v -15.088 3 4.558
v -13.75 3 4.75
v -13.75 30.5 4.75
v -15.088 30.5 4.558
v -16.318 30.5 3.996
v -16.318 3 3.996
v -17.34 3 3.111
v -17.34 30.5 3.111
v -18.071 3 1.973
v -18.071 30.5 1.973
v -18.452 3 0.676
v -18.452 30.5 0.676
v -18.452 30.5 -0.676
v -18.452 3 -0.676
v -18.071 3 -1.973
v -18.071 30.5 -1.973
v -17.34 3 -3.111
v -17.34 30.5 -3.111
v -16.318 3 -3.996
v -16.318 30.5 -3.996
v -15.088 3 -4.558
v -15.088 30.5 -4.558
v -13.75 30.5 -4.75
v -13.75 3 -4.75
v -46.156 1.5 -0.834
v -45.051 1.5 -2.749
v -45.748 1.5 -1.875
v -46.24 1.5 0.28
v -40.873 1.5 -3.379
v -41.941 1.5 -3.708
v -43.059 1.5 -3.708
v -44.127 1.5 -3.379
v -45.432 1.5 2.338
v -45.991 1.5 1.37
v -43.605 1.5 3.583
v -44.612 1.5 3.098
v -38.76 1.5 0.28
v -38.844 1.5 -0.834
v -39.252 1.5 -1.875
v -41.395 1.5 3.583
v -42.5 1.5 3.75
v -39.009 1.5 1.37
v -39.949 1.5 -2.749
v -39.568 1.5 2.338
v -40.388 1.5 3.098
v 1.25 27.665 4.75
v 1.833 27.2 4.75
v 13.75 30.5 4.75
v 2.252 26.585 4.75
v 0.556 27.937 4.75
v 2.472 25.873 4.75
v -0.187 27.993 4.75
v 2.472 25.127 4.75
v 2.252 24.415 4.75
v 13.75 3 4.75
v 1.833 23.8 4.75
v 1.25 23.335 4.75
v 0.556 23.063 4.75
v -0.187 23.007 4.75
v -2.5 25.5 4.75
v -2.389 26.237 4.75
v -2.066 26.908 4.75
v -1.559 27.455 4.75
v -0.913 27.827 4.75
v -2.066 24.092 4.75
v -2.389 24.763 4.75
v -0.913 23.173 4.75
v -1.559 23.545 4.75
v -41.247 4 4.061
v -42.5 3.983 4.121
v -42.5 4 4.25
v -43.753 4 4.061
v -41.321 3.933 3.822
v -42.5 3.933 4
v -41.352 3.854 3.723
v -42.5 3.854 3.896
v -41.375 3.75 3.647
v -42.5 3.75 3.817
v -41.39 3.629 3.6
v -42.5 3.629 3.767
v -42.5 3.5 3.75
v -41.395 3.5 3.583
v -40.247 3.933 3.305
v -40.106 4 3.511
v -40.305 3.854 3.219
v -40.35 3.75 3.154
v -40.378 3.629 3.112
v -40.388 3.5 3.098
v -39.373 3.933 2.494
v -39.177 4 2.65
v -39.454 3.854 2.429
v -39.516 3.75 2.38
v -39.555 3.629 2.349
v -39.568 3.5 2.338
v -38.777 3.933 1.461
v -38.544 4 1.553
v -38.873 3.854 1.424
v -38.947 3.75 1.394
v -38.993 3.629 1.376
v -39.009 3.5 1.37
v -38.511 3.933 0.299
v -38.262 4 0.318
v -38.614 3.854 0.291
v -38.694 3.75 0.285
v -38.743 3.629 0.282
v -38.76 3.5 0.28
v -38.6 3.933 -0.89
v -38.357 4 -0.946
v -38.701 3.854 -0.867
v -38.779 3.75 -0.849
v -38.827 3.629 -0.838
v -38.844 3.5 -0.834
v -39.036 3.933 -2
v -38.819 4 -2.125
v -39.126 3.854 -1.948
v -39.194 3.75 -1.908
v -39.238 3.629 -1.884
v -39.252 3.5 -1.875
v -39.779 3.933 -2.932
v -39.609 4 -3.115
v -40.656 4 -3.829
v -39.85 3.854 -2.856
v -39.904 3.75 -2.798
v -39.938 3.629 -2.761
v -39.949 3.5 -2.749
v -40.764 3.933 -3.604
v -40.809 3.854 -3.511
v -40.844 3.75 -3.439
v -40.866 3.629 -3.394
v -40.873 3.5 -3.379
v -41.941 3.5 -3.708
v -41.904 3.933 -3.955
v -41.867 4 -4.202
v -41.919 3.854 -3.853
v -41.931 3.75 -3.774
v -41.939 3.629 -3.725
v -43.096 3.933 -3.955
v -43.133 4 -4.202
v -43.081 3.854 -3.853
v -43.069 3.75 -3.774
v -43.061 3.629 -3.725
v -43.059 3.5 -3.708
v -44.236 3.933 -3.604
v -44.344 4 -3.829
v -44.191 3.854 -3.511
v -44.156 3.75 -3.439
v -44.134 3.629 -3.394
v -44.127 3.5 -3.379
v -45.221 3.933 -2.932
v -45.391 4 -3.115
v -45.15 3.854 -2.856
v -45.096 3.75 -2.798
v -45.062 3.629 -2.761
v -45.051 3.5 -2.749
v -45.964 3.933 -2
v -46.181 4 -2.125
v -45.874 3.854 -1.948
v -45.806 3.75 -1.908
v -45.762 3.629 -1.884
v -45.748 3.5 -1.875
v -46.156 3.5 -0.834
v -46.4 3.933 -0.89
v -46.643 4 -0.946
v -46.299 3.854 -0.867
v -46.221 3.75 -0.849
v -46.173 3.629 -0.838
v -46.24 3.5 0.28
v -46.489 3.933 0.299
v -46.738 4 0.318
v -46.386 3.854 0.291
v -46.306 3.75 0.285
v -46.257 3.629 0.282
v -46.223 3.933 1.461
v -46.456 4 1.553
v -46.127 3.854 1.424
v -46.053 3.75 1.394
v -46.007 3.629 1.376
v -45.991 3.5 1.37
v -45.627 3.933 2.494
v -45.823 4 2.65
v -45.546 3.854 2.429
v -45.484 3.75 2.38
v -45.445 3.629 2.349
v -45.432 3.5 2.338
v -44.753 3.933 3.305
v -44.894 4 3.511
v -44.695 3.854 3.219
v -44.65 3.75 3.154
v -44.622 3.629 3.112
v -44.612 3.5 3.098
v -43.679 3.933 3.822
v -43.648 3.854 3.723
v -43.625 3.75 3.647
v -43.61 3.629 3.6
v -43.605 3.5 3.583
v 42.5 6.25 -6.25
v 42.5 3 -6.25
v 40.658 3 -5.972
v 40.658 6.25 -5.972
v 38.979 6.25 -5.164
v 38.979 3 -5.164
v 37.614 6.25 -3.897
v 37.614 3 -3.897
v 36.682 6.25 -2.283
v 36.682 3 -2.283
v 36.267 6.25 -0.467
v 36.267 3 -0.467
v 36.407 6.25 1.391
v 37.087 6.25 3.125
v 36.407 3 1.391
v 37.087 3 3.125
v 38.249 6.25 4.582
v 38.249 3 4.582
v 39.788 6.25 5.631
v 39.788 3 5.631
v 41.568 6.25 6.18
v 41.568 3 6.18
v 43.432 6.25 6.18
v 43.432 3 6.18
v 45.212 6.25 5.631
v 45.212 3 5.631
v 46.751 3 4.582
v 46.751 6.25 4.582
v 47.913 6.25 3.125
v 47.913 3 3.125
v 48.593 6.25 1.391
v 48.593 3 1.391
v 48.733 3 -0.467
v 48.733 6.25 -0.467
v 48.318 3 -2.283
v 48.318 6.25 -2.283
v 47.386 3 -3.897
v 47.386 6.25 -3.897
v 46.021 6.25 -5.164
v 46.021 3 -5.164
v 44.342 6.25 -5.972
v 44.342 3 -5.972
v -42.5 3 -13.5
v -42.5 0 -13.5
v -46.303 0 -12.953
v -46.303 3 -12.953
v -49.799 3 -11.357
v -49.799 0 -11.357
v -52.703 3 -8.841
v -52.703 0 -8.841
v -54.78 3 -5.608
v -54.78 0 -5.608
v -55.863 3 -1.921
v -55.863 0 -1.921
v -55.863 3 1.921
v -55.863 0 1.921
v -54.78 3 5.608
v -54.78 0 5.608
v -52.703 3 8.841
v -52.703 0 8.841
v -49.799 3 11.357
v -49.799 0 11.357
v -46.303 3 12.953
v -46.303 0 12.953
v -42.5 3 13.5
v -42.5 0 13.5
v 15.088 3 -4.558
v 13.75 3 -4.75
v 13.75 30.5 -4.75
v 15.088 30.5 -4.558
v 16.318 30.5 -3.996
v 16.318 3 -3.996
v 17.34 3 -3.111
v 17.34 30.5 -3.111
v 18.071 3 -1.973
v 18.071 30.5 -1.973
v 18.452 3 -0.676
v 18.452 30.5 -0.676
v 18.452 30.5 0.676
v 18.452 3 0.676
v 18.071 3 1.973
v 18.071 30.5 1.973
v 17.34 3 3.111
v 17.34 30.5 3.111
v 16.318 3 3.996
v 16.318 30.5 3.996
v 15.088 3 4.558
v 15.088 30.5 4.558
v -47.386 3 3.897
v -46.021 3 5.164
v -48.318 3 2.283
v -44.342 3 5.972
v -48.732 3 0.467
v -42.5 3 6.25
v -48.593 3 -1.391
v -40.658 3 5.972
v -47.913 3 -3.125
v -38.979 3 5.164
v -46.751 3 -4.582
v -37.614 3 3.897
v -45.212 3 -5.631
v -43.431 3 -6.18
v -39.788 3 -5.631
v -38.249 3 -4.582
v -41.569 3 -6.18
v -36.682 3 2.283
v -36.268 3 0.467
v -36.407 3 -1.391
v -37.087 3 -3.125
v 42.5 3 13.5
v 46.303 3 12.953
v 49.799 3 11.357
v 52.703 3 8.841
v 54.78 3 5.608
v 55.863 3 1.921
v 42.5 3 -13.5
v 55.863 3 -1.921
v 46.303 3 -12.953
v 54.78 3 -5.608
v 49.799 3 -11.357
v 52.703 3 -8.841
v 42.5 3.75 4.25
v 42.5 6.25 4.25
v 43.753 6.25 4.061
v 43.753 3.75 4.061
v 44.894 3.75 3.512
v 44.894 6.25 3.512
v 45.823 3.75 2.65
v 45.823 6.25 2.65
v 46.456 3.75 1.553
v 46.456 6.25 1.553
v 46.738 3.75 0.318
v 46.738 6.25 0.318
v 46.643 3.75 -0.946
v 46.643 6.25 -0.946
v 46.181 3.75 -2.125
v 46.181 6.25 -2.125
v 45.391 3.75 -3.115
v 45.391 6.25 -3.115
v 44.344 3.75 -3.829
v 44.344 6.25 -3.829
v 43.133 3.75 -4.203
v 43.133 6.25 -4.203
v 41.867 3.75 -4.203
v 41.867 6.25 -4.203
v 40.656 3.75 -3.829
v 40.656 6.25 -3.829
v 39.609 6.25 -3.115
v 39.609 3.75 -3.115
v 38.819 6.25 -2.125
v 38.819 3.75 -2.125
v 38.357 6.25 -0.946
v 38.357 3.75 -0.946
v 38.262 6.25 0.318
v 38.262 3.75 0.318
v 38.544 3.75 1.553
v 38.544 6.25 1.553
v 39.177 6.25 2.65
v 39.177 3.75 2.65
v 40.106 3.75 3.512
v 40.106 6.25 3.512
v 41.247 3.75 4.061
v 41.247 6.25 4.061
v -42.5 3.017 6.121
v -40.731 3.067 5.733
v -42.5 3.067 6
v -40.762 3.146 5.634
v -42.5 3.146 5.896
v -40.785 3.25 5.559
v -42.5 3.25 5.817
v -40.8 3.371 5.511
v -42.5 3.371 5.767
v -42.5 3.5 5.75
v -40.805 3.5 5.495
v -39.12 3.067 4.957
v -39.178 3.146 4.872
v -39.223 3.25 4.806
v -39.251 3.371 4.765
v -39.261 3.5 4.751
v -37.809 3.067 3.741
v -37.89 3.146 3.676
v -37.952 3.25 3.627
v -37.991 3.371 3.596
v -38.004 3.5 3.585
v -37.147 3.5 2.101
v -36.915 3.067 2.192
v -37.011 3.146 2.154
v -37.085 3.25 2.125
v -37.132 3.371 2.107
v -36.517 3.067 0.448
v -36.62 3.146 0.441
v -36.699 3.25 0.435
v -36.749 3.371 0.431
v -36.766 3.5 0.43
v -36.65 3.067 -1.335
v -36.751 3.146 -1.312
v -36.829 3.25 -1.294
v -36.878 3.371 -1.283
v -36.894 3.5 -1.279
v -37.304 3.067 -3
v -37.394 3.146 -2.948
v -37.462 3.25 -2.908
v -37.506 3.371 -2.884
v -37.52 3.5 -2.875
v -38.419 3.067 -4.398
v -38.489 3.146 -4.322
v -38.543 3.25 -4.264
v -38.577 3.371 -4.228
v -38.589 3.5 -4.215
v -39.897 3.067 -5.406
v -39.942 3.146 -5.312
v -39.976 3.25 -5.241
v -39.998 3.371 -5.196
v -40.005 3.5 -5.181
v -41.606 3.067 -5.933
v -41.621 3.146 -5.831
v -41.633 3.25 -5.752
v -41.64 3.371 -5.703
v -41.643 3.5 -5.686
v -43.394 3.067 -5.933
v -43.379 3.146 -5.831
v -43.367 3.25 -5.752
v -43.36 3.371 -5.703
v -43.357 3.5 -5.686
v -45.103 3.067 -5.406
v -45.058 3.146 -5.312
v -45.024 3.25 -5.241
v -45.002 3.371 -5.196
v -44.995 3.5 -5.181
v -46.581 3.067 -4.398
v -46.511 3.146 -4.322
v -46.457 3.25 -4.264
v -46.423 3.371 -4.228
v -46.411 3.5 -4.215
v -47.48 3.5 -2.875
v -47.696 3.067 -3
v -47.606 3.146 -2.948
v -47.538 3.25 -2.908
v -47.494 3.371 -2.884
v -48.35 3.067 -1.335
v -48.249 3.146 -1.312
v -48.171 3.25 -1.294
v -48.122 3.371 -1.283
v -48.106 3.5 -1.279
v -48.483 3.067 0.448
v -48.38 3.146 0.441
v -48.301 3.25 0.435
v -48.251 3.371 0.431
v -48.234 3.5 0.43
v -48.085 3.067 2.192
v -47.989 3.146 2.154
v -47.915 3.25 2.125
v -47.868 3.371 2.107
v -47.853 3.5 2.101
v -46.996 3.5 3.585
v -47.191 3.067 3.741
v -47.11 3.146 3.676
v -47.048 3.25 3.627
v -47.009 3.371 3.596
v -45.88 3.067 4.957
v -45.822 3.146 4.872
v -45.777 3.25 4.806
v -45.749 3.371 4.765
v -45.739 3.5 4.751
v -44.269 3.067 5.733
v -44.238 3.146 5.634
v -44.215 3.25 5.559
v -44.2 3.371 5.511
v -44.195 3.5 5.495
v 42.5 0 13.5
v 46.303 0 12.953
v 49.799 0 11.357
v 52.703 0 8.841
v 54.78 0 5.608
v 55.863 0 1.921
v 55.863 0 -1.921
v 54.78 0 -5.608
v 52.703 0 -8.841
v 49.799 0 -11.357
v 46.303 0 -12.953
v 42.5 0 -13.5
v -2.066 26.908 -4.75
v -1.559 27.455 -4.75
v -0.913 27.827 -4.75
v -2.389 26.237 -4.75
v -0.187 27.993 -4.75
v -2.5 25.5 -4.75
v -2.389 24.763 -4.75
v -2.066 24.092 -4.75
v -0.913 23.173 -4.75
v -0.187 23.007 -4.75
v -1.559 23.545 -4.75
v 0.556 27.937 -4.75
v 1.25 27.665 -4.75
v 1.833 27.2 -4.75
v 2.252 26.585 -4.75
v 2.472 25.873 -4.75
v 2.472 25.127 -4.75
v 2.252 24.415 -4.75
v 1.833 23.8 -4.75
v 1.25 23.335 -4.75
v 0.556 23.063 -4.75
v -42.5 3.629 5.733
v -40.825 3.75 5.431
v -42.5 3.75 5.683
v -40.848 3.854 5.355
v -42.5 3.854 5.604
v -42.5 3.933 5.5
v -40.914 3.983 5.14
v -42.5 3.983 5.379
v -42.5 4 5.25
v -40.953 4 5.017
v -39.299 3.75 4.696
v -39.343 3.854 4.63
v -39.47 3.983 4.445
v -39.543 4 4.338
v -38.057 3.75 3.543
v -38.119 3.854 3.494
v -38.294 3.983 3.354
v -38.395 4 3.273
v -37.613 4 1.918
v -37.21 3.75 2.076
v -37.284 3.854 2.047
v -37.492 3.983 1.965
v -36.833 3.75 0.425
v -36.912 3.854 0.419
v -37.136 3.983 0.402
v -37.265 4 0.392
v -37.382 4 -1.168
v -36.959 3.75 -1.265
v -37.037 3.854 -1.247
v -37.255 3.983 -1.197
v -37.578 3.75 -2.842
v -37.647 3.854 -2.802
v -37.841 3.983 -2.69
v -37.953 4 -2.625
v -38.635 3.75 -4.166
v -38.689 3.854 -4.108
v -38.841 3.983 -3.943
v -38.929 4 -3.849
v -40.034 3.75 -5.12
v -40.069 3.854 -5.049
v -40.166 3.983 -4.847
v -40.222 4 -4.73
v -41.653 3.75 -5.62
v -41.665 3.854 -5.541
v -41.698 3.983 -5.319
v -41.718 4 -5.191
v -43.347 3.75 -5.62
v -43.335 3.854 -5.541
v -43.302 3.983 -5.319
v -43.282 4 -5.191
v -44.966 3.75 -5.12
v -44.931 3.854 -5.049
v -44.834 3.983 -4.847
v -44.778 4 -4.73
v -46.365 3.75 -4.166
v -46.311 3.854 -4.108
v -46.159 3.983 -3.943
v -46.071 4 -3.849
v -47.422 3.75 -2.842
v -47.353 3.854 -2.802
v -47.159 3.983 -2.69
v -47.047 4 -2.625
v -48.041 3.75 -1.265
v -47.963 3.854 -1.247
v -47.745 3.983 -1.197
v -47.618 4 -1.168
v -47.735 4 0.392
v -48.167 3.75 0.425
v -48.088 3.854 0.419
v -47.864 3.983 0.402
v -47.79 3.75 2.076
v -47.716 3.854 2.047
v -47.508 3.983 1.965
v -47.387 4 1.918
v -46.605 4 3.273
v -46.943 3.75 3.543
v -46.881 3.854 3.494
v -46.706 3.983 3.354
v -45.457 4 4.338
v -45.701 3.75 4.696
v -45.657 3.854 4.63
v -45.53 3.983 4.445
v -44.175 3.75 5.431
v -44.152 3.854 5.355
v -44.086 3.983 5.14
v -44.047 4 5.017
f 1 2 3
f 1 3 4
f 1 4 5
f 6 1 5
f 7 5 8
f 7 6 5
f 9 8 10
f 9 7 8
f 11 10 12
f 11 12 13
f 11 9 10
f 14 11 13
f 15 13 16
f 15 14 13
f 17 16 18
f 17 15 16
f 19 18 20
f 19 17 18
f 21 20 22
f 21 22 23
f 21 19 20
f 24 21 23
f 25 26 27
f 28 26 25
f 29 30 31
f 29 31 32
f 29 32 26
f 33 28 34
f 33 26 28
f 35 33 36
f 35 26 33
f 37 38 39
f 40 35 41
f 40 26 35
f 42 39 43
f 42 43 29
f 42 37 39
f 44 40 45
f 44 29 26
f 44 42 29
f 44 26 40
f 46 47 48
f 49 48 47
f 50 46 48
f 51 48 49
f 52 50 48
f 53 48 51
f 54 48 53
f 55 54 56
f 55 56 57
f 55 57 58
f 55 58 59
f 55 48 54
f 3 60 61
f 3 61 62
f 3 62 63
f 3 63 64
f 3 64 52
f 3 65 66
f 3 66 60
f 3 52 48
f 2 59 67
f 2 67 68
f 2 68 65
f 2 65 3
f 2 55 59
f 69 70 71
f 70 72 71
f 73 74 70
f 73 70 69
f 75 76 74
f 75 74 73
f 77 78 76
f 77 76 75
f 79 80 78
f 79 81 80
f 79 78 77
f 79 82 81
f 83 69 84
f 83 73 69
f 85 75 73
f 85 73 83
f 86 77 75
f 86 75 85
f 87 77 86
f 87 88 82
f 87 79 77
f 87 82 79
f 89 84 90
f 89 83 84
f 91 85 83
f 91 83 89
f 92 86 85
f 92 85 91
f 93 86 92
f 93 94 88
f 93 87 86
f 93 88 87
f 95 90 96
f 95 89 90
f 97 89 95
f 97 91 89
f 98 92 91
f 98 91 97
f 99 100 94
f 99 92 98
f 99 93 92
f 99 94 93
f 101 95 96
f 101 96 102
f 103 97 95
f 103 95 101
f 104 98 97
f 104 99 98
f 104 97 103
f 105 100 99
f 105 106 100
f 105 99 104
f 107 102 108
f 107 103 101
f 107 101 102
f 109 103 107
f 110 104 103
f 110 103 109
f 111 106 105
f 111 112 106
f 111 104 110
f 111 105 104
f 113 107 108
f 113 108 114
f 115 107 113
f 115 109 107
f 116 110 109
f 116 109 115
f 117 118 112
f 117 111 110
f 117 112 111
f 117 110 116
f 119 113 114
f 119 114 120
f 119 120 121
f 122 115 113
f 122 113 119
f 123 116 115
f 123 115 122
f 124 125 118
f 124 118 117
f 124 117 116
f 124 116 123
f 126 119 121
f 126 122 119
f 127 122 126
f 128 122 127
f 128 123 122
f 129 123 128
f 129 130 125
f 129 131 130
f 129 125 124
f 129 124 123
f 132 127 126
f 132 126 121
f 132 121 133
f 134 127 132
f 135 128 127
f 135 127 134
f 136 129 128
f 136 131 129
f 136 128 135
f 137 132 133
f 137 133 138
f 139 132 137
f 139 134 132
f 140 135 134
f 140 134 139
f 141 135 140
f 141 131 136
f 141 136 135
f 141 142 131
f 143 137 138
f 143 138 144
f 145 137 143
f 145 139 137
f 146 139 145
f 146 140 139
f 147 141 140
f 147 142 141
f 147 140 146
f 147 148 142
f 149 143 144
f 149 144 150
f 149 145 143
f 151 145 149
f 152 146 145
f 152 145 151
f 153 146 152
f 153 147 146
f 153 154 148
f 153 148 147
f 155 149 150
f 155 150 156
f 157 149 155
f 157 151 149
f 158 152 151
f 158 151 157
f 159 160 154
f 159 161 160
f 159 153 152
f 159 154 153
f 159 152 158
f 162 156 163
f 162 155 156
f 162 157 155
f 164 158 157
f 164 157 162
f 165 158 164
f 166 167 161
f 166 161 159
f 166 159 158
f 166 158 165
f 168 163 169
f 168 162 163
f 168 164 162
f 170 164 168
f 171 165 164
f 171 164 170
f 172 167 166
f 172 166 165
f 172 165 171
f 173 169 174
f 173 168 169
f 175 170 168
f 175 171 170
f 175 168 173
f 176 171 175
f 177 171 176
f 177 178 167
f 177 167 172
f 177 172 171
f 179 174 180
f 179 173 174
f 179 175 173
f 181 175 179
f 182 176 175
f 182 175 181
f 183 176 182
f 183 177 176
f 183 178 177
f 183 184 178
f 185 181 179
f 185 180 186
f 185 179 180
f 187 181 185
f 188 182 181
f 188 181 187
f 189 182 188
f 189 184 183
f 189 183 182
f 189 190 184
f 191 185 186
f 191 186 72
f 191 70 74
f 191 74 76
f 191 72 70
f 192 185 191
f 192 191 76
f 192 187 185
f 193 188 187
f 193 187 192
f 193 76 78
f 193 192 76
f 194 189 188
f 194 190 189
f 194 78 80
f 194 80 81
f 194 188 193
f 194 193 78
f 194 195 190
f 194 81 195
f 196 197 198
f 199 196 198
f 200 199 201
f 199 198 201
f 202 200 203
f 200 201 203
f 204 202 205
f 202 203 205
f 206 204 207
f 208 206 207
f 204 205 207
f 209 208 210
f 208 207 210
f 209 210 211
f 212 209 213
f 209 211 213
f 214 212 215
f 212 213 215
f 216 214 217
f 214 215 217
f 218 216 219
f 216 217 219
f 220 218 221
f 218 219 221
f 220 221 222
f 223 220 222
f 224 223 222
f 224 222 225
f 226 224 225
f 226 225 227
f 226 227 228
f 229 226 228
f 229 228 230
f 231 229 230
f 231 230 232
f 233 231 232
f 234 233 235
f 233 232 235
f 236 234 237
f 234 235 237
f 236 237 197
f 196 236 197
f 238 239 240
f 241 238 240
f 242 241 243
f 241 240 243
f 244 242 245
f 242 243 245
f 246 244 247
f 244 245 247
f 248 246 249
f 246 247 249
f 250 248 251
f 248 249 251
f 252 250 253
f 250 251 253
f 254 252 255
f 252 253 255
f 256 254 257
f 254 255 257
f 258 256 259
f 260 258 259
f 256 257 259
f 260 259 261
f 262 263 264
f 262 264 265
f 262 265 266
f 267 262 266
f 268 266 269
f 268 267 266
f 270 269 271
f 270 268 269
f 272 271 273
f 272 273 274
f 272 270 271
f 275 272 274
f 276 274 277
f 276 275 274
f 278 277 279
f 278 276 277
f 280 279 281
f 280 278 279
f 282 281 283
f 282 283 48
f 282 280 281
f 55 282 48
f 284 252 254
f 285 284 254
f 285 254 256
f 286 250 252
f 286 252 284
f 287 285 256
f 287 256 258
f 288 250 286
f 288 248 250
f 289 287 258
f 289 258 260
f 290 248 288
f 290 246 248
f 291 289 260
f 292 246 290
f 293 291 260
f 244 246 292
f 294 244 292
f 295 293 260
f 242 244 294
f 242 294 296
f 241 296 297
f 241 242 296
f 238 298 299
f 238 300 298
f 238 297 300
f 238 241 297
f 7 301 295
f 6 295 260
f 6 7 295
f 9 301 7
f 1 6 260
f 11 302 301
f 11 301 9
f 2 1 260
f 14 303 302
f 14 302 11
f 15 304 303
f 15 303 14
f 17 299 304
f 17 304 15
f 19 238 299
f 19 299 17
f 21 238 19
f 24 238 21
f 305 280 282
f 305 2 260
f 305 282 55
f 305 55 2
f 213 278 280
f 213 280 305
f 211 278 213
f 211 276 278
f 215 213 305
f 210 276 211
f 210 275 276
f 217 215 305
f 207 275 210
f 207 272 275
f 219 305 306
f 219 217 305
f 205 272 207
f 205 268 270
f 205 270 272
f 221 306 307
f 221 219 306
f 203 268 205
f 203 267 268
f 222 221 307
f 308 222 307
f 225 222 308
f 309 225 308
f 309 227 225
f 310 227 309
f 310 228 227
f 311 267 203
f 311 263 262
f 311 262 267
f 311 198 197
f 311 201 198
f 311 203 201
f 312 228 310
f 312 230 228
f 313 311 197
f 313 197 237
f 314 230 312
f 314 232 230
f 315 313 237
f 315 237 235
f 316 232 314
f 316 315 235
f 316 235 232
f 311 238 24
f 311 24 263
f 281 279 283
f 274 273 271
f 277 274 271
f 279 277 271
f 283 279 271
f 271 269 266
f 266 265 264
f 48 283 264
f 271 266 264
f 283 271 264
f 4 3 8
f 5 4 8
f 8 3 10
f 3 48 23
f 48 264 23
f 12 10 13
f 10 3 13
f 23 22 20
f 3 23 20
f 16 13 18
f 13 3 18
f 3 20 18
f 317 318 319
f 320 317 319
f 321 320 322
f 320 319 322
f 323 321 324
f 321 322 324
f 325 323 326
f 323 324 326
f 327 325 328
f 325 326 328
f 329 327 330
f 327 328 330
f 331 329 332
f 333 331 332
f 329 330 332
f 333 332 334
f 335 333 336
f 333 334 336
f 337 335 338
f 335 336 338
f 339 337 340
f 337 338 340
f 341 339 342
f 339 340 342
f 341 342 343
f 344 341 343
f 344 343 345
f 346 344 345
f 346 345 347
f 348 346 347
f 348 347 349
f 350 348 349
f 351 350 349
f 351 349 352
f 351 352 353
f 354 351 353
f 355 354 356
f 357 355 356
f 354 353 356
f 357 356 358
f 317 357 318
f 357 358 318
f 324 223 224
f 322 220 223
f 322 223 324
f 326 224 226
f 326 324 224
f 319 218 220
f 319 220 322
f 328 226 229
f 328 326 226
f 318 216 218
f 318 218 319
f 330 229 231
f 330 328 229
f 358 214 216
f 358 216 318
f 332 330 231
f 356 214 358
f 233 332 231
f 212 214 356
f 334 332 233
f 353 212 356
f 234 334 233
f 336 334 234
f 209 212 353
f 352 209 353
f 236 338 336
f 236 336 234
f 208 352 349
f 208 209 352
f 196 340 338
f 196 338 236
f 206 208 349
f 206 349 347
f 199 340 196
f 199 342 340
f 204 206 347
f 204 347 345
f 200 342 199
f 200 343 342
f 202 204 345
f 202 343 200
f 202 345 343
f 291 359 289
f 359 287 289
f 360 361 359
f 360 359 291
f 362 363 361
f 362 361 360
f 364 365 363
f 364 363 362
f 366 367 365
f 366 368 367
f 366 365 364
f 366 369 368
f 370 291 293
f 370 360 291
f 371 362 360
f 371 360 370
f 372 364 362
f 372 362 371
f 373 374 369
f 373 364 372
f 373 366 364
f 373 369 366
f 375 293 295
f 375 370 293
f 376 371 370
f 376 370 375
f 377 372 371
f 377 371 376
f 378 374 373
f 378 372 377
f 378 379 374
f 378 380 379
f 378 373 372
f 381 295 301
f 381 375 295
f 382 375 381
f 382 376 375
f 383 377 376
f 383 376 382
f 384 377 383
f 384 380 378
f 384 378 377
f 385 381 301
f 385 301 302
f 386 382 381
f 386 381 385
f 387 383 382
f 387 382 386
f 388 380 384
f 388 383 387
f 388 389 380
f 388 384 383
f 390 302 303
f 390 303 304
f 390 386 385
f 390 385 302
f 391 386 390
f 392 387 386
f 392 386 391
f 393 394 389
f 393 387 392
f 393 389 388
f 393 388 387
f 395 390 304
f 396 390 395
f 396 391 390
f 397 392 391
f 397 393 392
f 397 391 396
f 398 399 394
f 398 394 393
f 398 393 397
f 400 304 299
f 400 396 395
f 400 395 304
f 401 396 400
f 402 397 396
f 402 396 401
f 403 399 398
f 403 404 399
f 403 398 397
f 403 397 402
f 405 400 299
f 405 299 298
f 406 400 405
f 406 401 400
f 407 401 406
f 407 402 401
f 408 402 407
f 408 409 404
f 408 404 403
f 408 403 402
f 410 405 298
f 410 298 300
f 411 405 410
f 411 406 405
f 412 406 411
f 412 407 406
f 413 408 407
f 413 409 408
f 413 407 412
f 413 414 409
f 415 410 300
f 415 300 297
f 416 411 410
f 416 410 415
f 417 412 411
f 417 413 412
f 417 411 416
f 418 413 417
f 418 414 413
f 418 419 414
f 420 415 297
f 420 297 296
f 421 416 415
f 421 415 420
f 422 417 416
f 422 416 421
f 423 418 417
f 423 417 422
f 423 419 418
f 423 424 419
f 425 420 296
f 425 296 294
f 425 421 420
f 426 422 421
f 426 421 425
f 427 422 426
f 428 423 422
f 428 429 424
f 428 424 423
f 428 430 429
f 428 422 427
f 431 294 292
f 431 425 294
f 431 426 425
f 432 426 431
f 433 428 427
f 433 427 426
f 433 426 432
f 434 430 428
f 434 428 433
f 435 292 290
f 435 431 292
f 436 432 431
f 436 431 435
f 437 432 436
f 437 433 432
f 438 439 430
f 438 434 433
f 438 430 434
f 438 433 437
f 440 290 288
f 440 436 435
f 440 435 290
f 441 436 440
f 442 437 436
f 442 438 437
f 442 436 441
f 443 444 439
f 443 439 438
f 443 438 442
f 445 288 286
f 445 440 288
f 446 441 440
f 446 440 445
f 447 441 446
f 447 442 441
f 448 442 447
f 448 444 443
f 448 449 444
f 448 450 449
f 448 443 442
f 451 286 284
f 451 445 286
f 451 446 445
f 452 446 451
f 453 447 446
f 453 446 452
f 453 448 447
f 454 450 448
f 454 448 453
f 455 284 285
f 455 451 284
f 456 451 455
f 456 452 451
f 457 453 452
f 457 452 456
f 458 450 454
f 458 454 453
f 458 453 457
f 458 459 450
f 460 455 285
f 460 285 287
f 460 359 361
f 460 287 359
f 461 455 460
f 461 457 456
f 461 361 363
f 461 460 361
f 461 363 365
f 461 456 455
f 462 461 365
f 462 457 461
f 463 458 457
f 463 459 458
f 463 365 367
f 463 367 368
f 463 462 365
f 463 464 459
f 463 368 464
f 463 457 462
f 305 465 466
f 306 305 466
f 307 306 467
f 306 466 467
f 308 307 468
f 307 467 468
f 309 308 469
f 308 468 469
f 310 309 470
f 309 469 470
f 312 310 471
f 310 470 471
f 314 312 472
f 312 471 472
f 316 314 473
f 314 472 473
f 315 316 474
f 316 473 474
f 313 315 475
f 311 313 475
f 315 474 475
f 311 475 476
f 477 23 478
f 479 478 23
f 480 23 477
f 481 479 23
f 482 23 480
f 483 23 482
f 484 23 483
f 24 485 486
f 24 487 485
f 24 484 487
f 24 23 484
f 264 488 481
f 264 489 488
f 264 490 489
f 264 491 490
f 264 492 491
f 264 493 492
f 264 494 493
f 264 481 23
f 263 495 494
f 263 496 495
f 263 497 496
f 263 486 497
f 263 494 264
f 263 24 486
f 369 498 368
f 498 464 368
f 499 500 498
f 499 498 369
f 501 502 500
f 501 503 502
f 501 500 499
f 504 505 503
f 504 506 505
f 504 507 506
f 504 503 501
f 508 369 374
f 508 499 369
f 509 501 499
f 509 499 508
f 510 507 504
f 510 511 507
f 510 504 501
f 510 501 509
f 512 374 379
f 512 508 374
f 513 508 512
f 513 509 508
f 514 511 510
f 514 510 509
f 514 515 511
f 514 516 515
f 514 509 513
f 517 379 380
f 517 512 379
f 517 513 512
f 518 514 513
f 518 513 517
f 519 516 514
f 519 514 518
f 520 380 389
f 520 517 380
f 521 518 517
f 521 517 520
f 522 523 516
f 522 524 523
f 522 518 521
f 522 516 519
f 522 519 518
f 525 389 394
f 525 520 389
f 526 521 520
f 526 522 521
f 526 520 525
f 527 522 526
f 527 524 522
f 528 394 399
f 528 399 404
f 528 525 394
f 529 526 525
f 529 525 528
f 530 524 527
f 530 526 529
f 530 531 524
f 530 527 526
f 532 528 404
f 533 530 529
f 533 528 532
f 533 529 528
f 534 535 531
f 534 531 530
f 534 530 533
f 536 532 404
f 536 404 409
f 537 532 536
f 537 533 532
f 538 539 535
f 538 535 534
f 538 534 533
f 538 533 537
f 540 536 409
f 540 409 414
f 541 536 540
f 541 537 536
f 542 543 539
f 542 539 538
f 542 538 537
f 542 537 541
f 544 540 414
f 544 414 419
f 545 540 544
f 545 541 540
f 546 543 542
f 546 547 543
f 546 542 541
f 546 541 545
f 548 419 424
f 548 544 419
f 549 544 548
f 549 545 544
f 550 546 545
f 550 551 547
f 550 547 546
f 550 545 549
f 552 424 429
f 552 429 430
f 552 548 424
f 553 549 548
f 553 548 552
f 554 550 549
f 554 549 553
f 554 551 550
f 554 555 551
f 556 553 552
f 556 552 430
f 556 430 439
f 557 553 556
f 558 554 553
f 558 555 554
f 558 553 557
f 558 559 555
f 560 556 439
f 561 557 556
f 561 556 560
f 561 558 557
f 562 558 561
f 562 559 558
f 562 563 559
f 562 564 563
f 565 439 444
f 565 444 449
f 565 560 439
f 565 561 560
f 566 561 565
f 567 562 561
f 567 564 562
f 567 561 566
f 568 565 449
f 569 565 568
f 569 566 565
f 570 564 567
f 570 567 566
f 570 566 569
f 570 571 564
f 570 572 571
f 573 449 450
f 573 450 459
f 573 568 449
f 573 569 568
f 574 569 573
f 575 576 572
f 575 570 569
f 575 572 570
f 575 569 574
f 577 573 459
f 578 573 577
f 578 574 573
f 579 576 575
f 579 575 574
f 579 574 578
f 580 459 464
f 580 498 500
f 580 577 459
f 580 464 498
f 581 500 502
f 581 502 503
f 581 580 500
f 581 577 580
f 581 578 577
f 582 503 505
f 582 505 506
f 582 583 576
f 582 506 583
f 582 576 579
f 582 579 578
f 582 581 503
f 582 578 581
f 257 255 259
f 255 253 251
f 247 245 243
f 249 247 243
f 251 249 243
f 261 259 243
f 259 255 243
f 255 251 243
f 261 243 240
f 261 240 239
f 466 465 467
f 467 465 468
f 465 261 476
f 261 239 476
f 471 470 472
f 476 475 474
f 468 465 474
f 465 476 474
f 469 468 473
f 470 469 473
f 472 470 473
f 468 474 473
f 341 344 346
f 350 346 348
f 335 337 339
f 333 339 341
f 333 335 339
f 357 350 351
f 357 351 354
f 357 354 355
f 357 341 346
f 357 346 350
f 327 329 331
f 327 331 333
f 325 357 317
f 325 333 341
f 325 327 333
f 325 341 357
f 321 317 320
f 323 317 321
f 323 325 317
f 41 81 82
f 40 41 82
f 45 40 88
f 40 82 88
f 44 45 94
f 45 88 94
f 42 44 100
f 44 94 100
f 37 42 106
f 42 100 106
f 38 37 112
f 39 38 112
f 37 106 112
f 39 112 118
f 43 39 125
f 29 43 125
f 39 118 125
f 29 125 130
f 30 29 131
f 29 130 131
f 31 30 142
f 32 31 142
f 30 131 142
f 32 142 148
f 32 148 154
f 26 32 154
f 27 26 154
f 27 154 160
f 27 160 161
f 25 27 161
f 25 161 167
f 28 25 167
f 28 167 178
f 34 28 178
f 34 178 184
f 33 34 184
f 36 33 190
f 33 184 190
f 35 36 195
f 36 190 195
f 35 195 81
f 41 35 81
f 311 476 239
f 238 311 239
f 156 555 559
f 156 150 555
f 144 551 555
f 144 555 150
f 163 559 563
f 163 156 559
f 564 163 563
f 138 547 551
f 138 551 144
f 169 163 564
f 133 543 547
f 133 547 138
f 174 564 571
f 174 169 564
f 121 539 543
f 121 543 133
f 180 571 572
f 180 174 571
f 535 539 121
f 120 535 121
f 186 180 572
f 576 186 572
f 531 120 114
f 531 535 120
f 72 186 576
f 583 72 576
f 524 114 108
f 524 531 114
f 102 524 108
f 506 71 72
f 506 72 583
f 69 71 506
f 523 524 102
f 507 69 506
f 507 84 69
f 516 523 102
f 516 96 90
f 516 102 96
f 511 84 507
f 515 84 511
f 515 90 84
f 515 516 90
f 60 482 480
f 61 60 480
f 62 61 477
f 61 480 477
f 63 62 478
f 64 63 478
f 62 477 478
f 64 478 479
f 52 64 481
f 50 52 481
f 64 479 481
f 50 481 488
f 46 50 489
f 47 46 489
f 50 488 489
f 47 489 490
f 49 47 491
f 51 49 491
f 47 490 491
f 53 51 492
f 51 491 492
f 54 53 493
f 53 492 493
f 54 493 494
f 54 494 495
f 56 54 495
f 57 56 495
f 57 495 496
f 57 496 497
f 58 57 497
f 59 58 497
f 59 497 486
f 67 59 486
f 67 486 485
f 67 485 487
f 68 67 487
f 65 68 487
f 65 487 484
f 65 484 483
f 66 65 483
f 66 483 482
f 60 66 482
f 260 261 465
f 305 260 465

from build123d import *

# Parameters (mm, degrees)
BOSS_EXTRUDE1_DEPTH = 3
SKETCH7_R           = 5.75
BOSS_EXTRUDE5_DEPTH = 1
SKETCH2_R           = 3.75
CUT_EXTRUDE1_DEPTH  = 2.5
SKETCH3_R           = 6.25
BOSS_EXTRUDE3_DEPTH = 3.25
SKETCH4_R           = 4.25
CUT_EXTRUDE2_DEPTH  = 2.5
BOSS_EXTRUDE4_DEPTH = 27.5
SKETCH6_R           = 2.5
CUT_EXTRUDE3_DEPTH  = 67.327313378
FILLET1_R           = 0.5


with BuildPart() as part:
    # Sketch1 → Boss-Extrude1 (new body)
    with BuildSketch(Plane(origin=(0, 0, 0), x_dir=(1, 0, 0), z_dir=(0, 1, 0))):
        with BuildLine():
            Line((-42.5, -13.5), (42.5, -13.5))
            ThreePointArc((42.5, -13.5), (56, 0), (42.5, 13.5))
            Line((42.5, 13.5), (-42.5, 13.5))
            ThreePointArc((-42.5, 13.5), (-56, 0), (-42.5, -13.5))
        make_face()
    extrude(amount=BOSS_EXTRUDE1_DEPTH)

    # Sketch7 → Boss-Extrude5 (add)
    with BuildSketch(Plane(origin=(0, 3, 0), x_dir=(1, 0, 0), z_dir=(0, 1, 0))):
        with Locations(Location((-42.5, 0, 0), (0, 0, 270))):
            Circle(SKETCH7_R)
    extrude(amount=BOSS_EXTRUDE5_DEPTH)

    # Sketch2 → Cut-Extrude1 (cut)
    with BuildSketch(Plane(origin=(0, 4, 0), x_dir=(1, 0, 0), z_dir=(0, 1, 0))):
        with Locations(Location((-42.5, 0, 0), (0, 0, 270))):
            Circle(SKETCH2_R)
    extrude(amount=-CUT_EXTRUDE1_DEPTH, mode=Mode.SUBTRACT)

    # Sketch3 → Boss-Extrude3 (add)
    with BuildSketch(Plane(origin=(0, 3, 0), x_dir=(1, 0, 0), z_dir=(0, 1, 0))):
        with Locations(Location((42.5, 0, 0), (0, 0, 90))):
            Circle(SKETCH3_R)
    extrude(amount=BOSS_EXTRUDE3_DEPTH)

    # Sketch4 → Cut-Extrude2 (cut)
    with BuildSketch(Plane(origin=(0, 6.25, 0), x_dir=(1, 0, 0), z_dir=(0, 1, 0))):
        with Locations(Location((42.5, 0, 0), (0, 0, 270))):
            Circle(SKETCH4_R)
    extrude(amount=-CUT_EXTRUDE2_DEPTH, mode=Mode.SUBTRACT)

    # Sketch5 → Boss-Extrude4 (add)
    with BuildSketch(Plane(origin=(0, 3, 0), x_dir=(1, 0, 0), z_dir=(0, 1, 0))):
        with BuildLine():
            Line((-13.75, 4.75), (13.75, 4.75))
            ThreePointArc((13.75, 4.75), (18.5, 0), (13.75, -4.75))
            Line((13.75, -4.75), (-13.75, -4.75))
            ThreePointArc((-13.75, -4.75), (-18.5, 0), (-13.75, 4.75))
        make_face()
    extrude(amount=BOSS_EXTRUDE4_DEPTH)

    # Sketch6 → Cut-Extrude3 (cut, through all)
    with BuildSketch(Plane(origin=(0, 0, -4.75), x_dir=(-1, 0, 0), z_dir=(0, 0, -1))):
        with Locations((0, 25.5)):
            Circle(SKETCH6_R)
    extrude(amount=-CUT_EXTRUDE3_DEPTH, mode=Mode.SUBTRACT)

    # Fillet1
    fillet1_edges = [part.edges().sort_by_distance(p)[0] for p in [
        (-42.5, 3, -5.75),
        (-42.5, 4, -5.75),
        (-42.5, 4, -3.75),
    ]]
    fillet(fillet1_edges, radius=FILLET1_R - 0.0001)  # a hair under: the kernel refuses the full size


solid = part.part
